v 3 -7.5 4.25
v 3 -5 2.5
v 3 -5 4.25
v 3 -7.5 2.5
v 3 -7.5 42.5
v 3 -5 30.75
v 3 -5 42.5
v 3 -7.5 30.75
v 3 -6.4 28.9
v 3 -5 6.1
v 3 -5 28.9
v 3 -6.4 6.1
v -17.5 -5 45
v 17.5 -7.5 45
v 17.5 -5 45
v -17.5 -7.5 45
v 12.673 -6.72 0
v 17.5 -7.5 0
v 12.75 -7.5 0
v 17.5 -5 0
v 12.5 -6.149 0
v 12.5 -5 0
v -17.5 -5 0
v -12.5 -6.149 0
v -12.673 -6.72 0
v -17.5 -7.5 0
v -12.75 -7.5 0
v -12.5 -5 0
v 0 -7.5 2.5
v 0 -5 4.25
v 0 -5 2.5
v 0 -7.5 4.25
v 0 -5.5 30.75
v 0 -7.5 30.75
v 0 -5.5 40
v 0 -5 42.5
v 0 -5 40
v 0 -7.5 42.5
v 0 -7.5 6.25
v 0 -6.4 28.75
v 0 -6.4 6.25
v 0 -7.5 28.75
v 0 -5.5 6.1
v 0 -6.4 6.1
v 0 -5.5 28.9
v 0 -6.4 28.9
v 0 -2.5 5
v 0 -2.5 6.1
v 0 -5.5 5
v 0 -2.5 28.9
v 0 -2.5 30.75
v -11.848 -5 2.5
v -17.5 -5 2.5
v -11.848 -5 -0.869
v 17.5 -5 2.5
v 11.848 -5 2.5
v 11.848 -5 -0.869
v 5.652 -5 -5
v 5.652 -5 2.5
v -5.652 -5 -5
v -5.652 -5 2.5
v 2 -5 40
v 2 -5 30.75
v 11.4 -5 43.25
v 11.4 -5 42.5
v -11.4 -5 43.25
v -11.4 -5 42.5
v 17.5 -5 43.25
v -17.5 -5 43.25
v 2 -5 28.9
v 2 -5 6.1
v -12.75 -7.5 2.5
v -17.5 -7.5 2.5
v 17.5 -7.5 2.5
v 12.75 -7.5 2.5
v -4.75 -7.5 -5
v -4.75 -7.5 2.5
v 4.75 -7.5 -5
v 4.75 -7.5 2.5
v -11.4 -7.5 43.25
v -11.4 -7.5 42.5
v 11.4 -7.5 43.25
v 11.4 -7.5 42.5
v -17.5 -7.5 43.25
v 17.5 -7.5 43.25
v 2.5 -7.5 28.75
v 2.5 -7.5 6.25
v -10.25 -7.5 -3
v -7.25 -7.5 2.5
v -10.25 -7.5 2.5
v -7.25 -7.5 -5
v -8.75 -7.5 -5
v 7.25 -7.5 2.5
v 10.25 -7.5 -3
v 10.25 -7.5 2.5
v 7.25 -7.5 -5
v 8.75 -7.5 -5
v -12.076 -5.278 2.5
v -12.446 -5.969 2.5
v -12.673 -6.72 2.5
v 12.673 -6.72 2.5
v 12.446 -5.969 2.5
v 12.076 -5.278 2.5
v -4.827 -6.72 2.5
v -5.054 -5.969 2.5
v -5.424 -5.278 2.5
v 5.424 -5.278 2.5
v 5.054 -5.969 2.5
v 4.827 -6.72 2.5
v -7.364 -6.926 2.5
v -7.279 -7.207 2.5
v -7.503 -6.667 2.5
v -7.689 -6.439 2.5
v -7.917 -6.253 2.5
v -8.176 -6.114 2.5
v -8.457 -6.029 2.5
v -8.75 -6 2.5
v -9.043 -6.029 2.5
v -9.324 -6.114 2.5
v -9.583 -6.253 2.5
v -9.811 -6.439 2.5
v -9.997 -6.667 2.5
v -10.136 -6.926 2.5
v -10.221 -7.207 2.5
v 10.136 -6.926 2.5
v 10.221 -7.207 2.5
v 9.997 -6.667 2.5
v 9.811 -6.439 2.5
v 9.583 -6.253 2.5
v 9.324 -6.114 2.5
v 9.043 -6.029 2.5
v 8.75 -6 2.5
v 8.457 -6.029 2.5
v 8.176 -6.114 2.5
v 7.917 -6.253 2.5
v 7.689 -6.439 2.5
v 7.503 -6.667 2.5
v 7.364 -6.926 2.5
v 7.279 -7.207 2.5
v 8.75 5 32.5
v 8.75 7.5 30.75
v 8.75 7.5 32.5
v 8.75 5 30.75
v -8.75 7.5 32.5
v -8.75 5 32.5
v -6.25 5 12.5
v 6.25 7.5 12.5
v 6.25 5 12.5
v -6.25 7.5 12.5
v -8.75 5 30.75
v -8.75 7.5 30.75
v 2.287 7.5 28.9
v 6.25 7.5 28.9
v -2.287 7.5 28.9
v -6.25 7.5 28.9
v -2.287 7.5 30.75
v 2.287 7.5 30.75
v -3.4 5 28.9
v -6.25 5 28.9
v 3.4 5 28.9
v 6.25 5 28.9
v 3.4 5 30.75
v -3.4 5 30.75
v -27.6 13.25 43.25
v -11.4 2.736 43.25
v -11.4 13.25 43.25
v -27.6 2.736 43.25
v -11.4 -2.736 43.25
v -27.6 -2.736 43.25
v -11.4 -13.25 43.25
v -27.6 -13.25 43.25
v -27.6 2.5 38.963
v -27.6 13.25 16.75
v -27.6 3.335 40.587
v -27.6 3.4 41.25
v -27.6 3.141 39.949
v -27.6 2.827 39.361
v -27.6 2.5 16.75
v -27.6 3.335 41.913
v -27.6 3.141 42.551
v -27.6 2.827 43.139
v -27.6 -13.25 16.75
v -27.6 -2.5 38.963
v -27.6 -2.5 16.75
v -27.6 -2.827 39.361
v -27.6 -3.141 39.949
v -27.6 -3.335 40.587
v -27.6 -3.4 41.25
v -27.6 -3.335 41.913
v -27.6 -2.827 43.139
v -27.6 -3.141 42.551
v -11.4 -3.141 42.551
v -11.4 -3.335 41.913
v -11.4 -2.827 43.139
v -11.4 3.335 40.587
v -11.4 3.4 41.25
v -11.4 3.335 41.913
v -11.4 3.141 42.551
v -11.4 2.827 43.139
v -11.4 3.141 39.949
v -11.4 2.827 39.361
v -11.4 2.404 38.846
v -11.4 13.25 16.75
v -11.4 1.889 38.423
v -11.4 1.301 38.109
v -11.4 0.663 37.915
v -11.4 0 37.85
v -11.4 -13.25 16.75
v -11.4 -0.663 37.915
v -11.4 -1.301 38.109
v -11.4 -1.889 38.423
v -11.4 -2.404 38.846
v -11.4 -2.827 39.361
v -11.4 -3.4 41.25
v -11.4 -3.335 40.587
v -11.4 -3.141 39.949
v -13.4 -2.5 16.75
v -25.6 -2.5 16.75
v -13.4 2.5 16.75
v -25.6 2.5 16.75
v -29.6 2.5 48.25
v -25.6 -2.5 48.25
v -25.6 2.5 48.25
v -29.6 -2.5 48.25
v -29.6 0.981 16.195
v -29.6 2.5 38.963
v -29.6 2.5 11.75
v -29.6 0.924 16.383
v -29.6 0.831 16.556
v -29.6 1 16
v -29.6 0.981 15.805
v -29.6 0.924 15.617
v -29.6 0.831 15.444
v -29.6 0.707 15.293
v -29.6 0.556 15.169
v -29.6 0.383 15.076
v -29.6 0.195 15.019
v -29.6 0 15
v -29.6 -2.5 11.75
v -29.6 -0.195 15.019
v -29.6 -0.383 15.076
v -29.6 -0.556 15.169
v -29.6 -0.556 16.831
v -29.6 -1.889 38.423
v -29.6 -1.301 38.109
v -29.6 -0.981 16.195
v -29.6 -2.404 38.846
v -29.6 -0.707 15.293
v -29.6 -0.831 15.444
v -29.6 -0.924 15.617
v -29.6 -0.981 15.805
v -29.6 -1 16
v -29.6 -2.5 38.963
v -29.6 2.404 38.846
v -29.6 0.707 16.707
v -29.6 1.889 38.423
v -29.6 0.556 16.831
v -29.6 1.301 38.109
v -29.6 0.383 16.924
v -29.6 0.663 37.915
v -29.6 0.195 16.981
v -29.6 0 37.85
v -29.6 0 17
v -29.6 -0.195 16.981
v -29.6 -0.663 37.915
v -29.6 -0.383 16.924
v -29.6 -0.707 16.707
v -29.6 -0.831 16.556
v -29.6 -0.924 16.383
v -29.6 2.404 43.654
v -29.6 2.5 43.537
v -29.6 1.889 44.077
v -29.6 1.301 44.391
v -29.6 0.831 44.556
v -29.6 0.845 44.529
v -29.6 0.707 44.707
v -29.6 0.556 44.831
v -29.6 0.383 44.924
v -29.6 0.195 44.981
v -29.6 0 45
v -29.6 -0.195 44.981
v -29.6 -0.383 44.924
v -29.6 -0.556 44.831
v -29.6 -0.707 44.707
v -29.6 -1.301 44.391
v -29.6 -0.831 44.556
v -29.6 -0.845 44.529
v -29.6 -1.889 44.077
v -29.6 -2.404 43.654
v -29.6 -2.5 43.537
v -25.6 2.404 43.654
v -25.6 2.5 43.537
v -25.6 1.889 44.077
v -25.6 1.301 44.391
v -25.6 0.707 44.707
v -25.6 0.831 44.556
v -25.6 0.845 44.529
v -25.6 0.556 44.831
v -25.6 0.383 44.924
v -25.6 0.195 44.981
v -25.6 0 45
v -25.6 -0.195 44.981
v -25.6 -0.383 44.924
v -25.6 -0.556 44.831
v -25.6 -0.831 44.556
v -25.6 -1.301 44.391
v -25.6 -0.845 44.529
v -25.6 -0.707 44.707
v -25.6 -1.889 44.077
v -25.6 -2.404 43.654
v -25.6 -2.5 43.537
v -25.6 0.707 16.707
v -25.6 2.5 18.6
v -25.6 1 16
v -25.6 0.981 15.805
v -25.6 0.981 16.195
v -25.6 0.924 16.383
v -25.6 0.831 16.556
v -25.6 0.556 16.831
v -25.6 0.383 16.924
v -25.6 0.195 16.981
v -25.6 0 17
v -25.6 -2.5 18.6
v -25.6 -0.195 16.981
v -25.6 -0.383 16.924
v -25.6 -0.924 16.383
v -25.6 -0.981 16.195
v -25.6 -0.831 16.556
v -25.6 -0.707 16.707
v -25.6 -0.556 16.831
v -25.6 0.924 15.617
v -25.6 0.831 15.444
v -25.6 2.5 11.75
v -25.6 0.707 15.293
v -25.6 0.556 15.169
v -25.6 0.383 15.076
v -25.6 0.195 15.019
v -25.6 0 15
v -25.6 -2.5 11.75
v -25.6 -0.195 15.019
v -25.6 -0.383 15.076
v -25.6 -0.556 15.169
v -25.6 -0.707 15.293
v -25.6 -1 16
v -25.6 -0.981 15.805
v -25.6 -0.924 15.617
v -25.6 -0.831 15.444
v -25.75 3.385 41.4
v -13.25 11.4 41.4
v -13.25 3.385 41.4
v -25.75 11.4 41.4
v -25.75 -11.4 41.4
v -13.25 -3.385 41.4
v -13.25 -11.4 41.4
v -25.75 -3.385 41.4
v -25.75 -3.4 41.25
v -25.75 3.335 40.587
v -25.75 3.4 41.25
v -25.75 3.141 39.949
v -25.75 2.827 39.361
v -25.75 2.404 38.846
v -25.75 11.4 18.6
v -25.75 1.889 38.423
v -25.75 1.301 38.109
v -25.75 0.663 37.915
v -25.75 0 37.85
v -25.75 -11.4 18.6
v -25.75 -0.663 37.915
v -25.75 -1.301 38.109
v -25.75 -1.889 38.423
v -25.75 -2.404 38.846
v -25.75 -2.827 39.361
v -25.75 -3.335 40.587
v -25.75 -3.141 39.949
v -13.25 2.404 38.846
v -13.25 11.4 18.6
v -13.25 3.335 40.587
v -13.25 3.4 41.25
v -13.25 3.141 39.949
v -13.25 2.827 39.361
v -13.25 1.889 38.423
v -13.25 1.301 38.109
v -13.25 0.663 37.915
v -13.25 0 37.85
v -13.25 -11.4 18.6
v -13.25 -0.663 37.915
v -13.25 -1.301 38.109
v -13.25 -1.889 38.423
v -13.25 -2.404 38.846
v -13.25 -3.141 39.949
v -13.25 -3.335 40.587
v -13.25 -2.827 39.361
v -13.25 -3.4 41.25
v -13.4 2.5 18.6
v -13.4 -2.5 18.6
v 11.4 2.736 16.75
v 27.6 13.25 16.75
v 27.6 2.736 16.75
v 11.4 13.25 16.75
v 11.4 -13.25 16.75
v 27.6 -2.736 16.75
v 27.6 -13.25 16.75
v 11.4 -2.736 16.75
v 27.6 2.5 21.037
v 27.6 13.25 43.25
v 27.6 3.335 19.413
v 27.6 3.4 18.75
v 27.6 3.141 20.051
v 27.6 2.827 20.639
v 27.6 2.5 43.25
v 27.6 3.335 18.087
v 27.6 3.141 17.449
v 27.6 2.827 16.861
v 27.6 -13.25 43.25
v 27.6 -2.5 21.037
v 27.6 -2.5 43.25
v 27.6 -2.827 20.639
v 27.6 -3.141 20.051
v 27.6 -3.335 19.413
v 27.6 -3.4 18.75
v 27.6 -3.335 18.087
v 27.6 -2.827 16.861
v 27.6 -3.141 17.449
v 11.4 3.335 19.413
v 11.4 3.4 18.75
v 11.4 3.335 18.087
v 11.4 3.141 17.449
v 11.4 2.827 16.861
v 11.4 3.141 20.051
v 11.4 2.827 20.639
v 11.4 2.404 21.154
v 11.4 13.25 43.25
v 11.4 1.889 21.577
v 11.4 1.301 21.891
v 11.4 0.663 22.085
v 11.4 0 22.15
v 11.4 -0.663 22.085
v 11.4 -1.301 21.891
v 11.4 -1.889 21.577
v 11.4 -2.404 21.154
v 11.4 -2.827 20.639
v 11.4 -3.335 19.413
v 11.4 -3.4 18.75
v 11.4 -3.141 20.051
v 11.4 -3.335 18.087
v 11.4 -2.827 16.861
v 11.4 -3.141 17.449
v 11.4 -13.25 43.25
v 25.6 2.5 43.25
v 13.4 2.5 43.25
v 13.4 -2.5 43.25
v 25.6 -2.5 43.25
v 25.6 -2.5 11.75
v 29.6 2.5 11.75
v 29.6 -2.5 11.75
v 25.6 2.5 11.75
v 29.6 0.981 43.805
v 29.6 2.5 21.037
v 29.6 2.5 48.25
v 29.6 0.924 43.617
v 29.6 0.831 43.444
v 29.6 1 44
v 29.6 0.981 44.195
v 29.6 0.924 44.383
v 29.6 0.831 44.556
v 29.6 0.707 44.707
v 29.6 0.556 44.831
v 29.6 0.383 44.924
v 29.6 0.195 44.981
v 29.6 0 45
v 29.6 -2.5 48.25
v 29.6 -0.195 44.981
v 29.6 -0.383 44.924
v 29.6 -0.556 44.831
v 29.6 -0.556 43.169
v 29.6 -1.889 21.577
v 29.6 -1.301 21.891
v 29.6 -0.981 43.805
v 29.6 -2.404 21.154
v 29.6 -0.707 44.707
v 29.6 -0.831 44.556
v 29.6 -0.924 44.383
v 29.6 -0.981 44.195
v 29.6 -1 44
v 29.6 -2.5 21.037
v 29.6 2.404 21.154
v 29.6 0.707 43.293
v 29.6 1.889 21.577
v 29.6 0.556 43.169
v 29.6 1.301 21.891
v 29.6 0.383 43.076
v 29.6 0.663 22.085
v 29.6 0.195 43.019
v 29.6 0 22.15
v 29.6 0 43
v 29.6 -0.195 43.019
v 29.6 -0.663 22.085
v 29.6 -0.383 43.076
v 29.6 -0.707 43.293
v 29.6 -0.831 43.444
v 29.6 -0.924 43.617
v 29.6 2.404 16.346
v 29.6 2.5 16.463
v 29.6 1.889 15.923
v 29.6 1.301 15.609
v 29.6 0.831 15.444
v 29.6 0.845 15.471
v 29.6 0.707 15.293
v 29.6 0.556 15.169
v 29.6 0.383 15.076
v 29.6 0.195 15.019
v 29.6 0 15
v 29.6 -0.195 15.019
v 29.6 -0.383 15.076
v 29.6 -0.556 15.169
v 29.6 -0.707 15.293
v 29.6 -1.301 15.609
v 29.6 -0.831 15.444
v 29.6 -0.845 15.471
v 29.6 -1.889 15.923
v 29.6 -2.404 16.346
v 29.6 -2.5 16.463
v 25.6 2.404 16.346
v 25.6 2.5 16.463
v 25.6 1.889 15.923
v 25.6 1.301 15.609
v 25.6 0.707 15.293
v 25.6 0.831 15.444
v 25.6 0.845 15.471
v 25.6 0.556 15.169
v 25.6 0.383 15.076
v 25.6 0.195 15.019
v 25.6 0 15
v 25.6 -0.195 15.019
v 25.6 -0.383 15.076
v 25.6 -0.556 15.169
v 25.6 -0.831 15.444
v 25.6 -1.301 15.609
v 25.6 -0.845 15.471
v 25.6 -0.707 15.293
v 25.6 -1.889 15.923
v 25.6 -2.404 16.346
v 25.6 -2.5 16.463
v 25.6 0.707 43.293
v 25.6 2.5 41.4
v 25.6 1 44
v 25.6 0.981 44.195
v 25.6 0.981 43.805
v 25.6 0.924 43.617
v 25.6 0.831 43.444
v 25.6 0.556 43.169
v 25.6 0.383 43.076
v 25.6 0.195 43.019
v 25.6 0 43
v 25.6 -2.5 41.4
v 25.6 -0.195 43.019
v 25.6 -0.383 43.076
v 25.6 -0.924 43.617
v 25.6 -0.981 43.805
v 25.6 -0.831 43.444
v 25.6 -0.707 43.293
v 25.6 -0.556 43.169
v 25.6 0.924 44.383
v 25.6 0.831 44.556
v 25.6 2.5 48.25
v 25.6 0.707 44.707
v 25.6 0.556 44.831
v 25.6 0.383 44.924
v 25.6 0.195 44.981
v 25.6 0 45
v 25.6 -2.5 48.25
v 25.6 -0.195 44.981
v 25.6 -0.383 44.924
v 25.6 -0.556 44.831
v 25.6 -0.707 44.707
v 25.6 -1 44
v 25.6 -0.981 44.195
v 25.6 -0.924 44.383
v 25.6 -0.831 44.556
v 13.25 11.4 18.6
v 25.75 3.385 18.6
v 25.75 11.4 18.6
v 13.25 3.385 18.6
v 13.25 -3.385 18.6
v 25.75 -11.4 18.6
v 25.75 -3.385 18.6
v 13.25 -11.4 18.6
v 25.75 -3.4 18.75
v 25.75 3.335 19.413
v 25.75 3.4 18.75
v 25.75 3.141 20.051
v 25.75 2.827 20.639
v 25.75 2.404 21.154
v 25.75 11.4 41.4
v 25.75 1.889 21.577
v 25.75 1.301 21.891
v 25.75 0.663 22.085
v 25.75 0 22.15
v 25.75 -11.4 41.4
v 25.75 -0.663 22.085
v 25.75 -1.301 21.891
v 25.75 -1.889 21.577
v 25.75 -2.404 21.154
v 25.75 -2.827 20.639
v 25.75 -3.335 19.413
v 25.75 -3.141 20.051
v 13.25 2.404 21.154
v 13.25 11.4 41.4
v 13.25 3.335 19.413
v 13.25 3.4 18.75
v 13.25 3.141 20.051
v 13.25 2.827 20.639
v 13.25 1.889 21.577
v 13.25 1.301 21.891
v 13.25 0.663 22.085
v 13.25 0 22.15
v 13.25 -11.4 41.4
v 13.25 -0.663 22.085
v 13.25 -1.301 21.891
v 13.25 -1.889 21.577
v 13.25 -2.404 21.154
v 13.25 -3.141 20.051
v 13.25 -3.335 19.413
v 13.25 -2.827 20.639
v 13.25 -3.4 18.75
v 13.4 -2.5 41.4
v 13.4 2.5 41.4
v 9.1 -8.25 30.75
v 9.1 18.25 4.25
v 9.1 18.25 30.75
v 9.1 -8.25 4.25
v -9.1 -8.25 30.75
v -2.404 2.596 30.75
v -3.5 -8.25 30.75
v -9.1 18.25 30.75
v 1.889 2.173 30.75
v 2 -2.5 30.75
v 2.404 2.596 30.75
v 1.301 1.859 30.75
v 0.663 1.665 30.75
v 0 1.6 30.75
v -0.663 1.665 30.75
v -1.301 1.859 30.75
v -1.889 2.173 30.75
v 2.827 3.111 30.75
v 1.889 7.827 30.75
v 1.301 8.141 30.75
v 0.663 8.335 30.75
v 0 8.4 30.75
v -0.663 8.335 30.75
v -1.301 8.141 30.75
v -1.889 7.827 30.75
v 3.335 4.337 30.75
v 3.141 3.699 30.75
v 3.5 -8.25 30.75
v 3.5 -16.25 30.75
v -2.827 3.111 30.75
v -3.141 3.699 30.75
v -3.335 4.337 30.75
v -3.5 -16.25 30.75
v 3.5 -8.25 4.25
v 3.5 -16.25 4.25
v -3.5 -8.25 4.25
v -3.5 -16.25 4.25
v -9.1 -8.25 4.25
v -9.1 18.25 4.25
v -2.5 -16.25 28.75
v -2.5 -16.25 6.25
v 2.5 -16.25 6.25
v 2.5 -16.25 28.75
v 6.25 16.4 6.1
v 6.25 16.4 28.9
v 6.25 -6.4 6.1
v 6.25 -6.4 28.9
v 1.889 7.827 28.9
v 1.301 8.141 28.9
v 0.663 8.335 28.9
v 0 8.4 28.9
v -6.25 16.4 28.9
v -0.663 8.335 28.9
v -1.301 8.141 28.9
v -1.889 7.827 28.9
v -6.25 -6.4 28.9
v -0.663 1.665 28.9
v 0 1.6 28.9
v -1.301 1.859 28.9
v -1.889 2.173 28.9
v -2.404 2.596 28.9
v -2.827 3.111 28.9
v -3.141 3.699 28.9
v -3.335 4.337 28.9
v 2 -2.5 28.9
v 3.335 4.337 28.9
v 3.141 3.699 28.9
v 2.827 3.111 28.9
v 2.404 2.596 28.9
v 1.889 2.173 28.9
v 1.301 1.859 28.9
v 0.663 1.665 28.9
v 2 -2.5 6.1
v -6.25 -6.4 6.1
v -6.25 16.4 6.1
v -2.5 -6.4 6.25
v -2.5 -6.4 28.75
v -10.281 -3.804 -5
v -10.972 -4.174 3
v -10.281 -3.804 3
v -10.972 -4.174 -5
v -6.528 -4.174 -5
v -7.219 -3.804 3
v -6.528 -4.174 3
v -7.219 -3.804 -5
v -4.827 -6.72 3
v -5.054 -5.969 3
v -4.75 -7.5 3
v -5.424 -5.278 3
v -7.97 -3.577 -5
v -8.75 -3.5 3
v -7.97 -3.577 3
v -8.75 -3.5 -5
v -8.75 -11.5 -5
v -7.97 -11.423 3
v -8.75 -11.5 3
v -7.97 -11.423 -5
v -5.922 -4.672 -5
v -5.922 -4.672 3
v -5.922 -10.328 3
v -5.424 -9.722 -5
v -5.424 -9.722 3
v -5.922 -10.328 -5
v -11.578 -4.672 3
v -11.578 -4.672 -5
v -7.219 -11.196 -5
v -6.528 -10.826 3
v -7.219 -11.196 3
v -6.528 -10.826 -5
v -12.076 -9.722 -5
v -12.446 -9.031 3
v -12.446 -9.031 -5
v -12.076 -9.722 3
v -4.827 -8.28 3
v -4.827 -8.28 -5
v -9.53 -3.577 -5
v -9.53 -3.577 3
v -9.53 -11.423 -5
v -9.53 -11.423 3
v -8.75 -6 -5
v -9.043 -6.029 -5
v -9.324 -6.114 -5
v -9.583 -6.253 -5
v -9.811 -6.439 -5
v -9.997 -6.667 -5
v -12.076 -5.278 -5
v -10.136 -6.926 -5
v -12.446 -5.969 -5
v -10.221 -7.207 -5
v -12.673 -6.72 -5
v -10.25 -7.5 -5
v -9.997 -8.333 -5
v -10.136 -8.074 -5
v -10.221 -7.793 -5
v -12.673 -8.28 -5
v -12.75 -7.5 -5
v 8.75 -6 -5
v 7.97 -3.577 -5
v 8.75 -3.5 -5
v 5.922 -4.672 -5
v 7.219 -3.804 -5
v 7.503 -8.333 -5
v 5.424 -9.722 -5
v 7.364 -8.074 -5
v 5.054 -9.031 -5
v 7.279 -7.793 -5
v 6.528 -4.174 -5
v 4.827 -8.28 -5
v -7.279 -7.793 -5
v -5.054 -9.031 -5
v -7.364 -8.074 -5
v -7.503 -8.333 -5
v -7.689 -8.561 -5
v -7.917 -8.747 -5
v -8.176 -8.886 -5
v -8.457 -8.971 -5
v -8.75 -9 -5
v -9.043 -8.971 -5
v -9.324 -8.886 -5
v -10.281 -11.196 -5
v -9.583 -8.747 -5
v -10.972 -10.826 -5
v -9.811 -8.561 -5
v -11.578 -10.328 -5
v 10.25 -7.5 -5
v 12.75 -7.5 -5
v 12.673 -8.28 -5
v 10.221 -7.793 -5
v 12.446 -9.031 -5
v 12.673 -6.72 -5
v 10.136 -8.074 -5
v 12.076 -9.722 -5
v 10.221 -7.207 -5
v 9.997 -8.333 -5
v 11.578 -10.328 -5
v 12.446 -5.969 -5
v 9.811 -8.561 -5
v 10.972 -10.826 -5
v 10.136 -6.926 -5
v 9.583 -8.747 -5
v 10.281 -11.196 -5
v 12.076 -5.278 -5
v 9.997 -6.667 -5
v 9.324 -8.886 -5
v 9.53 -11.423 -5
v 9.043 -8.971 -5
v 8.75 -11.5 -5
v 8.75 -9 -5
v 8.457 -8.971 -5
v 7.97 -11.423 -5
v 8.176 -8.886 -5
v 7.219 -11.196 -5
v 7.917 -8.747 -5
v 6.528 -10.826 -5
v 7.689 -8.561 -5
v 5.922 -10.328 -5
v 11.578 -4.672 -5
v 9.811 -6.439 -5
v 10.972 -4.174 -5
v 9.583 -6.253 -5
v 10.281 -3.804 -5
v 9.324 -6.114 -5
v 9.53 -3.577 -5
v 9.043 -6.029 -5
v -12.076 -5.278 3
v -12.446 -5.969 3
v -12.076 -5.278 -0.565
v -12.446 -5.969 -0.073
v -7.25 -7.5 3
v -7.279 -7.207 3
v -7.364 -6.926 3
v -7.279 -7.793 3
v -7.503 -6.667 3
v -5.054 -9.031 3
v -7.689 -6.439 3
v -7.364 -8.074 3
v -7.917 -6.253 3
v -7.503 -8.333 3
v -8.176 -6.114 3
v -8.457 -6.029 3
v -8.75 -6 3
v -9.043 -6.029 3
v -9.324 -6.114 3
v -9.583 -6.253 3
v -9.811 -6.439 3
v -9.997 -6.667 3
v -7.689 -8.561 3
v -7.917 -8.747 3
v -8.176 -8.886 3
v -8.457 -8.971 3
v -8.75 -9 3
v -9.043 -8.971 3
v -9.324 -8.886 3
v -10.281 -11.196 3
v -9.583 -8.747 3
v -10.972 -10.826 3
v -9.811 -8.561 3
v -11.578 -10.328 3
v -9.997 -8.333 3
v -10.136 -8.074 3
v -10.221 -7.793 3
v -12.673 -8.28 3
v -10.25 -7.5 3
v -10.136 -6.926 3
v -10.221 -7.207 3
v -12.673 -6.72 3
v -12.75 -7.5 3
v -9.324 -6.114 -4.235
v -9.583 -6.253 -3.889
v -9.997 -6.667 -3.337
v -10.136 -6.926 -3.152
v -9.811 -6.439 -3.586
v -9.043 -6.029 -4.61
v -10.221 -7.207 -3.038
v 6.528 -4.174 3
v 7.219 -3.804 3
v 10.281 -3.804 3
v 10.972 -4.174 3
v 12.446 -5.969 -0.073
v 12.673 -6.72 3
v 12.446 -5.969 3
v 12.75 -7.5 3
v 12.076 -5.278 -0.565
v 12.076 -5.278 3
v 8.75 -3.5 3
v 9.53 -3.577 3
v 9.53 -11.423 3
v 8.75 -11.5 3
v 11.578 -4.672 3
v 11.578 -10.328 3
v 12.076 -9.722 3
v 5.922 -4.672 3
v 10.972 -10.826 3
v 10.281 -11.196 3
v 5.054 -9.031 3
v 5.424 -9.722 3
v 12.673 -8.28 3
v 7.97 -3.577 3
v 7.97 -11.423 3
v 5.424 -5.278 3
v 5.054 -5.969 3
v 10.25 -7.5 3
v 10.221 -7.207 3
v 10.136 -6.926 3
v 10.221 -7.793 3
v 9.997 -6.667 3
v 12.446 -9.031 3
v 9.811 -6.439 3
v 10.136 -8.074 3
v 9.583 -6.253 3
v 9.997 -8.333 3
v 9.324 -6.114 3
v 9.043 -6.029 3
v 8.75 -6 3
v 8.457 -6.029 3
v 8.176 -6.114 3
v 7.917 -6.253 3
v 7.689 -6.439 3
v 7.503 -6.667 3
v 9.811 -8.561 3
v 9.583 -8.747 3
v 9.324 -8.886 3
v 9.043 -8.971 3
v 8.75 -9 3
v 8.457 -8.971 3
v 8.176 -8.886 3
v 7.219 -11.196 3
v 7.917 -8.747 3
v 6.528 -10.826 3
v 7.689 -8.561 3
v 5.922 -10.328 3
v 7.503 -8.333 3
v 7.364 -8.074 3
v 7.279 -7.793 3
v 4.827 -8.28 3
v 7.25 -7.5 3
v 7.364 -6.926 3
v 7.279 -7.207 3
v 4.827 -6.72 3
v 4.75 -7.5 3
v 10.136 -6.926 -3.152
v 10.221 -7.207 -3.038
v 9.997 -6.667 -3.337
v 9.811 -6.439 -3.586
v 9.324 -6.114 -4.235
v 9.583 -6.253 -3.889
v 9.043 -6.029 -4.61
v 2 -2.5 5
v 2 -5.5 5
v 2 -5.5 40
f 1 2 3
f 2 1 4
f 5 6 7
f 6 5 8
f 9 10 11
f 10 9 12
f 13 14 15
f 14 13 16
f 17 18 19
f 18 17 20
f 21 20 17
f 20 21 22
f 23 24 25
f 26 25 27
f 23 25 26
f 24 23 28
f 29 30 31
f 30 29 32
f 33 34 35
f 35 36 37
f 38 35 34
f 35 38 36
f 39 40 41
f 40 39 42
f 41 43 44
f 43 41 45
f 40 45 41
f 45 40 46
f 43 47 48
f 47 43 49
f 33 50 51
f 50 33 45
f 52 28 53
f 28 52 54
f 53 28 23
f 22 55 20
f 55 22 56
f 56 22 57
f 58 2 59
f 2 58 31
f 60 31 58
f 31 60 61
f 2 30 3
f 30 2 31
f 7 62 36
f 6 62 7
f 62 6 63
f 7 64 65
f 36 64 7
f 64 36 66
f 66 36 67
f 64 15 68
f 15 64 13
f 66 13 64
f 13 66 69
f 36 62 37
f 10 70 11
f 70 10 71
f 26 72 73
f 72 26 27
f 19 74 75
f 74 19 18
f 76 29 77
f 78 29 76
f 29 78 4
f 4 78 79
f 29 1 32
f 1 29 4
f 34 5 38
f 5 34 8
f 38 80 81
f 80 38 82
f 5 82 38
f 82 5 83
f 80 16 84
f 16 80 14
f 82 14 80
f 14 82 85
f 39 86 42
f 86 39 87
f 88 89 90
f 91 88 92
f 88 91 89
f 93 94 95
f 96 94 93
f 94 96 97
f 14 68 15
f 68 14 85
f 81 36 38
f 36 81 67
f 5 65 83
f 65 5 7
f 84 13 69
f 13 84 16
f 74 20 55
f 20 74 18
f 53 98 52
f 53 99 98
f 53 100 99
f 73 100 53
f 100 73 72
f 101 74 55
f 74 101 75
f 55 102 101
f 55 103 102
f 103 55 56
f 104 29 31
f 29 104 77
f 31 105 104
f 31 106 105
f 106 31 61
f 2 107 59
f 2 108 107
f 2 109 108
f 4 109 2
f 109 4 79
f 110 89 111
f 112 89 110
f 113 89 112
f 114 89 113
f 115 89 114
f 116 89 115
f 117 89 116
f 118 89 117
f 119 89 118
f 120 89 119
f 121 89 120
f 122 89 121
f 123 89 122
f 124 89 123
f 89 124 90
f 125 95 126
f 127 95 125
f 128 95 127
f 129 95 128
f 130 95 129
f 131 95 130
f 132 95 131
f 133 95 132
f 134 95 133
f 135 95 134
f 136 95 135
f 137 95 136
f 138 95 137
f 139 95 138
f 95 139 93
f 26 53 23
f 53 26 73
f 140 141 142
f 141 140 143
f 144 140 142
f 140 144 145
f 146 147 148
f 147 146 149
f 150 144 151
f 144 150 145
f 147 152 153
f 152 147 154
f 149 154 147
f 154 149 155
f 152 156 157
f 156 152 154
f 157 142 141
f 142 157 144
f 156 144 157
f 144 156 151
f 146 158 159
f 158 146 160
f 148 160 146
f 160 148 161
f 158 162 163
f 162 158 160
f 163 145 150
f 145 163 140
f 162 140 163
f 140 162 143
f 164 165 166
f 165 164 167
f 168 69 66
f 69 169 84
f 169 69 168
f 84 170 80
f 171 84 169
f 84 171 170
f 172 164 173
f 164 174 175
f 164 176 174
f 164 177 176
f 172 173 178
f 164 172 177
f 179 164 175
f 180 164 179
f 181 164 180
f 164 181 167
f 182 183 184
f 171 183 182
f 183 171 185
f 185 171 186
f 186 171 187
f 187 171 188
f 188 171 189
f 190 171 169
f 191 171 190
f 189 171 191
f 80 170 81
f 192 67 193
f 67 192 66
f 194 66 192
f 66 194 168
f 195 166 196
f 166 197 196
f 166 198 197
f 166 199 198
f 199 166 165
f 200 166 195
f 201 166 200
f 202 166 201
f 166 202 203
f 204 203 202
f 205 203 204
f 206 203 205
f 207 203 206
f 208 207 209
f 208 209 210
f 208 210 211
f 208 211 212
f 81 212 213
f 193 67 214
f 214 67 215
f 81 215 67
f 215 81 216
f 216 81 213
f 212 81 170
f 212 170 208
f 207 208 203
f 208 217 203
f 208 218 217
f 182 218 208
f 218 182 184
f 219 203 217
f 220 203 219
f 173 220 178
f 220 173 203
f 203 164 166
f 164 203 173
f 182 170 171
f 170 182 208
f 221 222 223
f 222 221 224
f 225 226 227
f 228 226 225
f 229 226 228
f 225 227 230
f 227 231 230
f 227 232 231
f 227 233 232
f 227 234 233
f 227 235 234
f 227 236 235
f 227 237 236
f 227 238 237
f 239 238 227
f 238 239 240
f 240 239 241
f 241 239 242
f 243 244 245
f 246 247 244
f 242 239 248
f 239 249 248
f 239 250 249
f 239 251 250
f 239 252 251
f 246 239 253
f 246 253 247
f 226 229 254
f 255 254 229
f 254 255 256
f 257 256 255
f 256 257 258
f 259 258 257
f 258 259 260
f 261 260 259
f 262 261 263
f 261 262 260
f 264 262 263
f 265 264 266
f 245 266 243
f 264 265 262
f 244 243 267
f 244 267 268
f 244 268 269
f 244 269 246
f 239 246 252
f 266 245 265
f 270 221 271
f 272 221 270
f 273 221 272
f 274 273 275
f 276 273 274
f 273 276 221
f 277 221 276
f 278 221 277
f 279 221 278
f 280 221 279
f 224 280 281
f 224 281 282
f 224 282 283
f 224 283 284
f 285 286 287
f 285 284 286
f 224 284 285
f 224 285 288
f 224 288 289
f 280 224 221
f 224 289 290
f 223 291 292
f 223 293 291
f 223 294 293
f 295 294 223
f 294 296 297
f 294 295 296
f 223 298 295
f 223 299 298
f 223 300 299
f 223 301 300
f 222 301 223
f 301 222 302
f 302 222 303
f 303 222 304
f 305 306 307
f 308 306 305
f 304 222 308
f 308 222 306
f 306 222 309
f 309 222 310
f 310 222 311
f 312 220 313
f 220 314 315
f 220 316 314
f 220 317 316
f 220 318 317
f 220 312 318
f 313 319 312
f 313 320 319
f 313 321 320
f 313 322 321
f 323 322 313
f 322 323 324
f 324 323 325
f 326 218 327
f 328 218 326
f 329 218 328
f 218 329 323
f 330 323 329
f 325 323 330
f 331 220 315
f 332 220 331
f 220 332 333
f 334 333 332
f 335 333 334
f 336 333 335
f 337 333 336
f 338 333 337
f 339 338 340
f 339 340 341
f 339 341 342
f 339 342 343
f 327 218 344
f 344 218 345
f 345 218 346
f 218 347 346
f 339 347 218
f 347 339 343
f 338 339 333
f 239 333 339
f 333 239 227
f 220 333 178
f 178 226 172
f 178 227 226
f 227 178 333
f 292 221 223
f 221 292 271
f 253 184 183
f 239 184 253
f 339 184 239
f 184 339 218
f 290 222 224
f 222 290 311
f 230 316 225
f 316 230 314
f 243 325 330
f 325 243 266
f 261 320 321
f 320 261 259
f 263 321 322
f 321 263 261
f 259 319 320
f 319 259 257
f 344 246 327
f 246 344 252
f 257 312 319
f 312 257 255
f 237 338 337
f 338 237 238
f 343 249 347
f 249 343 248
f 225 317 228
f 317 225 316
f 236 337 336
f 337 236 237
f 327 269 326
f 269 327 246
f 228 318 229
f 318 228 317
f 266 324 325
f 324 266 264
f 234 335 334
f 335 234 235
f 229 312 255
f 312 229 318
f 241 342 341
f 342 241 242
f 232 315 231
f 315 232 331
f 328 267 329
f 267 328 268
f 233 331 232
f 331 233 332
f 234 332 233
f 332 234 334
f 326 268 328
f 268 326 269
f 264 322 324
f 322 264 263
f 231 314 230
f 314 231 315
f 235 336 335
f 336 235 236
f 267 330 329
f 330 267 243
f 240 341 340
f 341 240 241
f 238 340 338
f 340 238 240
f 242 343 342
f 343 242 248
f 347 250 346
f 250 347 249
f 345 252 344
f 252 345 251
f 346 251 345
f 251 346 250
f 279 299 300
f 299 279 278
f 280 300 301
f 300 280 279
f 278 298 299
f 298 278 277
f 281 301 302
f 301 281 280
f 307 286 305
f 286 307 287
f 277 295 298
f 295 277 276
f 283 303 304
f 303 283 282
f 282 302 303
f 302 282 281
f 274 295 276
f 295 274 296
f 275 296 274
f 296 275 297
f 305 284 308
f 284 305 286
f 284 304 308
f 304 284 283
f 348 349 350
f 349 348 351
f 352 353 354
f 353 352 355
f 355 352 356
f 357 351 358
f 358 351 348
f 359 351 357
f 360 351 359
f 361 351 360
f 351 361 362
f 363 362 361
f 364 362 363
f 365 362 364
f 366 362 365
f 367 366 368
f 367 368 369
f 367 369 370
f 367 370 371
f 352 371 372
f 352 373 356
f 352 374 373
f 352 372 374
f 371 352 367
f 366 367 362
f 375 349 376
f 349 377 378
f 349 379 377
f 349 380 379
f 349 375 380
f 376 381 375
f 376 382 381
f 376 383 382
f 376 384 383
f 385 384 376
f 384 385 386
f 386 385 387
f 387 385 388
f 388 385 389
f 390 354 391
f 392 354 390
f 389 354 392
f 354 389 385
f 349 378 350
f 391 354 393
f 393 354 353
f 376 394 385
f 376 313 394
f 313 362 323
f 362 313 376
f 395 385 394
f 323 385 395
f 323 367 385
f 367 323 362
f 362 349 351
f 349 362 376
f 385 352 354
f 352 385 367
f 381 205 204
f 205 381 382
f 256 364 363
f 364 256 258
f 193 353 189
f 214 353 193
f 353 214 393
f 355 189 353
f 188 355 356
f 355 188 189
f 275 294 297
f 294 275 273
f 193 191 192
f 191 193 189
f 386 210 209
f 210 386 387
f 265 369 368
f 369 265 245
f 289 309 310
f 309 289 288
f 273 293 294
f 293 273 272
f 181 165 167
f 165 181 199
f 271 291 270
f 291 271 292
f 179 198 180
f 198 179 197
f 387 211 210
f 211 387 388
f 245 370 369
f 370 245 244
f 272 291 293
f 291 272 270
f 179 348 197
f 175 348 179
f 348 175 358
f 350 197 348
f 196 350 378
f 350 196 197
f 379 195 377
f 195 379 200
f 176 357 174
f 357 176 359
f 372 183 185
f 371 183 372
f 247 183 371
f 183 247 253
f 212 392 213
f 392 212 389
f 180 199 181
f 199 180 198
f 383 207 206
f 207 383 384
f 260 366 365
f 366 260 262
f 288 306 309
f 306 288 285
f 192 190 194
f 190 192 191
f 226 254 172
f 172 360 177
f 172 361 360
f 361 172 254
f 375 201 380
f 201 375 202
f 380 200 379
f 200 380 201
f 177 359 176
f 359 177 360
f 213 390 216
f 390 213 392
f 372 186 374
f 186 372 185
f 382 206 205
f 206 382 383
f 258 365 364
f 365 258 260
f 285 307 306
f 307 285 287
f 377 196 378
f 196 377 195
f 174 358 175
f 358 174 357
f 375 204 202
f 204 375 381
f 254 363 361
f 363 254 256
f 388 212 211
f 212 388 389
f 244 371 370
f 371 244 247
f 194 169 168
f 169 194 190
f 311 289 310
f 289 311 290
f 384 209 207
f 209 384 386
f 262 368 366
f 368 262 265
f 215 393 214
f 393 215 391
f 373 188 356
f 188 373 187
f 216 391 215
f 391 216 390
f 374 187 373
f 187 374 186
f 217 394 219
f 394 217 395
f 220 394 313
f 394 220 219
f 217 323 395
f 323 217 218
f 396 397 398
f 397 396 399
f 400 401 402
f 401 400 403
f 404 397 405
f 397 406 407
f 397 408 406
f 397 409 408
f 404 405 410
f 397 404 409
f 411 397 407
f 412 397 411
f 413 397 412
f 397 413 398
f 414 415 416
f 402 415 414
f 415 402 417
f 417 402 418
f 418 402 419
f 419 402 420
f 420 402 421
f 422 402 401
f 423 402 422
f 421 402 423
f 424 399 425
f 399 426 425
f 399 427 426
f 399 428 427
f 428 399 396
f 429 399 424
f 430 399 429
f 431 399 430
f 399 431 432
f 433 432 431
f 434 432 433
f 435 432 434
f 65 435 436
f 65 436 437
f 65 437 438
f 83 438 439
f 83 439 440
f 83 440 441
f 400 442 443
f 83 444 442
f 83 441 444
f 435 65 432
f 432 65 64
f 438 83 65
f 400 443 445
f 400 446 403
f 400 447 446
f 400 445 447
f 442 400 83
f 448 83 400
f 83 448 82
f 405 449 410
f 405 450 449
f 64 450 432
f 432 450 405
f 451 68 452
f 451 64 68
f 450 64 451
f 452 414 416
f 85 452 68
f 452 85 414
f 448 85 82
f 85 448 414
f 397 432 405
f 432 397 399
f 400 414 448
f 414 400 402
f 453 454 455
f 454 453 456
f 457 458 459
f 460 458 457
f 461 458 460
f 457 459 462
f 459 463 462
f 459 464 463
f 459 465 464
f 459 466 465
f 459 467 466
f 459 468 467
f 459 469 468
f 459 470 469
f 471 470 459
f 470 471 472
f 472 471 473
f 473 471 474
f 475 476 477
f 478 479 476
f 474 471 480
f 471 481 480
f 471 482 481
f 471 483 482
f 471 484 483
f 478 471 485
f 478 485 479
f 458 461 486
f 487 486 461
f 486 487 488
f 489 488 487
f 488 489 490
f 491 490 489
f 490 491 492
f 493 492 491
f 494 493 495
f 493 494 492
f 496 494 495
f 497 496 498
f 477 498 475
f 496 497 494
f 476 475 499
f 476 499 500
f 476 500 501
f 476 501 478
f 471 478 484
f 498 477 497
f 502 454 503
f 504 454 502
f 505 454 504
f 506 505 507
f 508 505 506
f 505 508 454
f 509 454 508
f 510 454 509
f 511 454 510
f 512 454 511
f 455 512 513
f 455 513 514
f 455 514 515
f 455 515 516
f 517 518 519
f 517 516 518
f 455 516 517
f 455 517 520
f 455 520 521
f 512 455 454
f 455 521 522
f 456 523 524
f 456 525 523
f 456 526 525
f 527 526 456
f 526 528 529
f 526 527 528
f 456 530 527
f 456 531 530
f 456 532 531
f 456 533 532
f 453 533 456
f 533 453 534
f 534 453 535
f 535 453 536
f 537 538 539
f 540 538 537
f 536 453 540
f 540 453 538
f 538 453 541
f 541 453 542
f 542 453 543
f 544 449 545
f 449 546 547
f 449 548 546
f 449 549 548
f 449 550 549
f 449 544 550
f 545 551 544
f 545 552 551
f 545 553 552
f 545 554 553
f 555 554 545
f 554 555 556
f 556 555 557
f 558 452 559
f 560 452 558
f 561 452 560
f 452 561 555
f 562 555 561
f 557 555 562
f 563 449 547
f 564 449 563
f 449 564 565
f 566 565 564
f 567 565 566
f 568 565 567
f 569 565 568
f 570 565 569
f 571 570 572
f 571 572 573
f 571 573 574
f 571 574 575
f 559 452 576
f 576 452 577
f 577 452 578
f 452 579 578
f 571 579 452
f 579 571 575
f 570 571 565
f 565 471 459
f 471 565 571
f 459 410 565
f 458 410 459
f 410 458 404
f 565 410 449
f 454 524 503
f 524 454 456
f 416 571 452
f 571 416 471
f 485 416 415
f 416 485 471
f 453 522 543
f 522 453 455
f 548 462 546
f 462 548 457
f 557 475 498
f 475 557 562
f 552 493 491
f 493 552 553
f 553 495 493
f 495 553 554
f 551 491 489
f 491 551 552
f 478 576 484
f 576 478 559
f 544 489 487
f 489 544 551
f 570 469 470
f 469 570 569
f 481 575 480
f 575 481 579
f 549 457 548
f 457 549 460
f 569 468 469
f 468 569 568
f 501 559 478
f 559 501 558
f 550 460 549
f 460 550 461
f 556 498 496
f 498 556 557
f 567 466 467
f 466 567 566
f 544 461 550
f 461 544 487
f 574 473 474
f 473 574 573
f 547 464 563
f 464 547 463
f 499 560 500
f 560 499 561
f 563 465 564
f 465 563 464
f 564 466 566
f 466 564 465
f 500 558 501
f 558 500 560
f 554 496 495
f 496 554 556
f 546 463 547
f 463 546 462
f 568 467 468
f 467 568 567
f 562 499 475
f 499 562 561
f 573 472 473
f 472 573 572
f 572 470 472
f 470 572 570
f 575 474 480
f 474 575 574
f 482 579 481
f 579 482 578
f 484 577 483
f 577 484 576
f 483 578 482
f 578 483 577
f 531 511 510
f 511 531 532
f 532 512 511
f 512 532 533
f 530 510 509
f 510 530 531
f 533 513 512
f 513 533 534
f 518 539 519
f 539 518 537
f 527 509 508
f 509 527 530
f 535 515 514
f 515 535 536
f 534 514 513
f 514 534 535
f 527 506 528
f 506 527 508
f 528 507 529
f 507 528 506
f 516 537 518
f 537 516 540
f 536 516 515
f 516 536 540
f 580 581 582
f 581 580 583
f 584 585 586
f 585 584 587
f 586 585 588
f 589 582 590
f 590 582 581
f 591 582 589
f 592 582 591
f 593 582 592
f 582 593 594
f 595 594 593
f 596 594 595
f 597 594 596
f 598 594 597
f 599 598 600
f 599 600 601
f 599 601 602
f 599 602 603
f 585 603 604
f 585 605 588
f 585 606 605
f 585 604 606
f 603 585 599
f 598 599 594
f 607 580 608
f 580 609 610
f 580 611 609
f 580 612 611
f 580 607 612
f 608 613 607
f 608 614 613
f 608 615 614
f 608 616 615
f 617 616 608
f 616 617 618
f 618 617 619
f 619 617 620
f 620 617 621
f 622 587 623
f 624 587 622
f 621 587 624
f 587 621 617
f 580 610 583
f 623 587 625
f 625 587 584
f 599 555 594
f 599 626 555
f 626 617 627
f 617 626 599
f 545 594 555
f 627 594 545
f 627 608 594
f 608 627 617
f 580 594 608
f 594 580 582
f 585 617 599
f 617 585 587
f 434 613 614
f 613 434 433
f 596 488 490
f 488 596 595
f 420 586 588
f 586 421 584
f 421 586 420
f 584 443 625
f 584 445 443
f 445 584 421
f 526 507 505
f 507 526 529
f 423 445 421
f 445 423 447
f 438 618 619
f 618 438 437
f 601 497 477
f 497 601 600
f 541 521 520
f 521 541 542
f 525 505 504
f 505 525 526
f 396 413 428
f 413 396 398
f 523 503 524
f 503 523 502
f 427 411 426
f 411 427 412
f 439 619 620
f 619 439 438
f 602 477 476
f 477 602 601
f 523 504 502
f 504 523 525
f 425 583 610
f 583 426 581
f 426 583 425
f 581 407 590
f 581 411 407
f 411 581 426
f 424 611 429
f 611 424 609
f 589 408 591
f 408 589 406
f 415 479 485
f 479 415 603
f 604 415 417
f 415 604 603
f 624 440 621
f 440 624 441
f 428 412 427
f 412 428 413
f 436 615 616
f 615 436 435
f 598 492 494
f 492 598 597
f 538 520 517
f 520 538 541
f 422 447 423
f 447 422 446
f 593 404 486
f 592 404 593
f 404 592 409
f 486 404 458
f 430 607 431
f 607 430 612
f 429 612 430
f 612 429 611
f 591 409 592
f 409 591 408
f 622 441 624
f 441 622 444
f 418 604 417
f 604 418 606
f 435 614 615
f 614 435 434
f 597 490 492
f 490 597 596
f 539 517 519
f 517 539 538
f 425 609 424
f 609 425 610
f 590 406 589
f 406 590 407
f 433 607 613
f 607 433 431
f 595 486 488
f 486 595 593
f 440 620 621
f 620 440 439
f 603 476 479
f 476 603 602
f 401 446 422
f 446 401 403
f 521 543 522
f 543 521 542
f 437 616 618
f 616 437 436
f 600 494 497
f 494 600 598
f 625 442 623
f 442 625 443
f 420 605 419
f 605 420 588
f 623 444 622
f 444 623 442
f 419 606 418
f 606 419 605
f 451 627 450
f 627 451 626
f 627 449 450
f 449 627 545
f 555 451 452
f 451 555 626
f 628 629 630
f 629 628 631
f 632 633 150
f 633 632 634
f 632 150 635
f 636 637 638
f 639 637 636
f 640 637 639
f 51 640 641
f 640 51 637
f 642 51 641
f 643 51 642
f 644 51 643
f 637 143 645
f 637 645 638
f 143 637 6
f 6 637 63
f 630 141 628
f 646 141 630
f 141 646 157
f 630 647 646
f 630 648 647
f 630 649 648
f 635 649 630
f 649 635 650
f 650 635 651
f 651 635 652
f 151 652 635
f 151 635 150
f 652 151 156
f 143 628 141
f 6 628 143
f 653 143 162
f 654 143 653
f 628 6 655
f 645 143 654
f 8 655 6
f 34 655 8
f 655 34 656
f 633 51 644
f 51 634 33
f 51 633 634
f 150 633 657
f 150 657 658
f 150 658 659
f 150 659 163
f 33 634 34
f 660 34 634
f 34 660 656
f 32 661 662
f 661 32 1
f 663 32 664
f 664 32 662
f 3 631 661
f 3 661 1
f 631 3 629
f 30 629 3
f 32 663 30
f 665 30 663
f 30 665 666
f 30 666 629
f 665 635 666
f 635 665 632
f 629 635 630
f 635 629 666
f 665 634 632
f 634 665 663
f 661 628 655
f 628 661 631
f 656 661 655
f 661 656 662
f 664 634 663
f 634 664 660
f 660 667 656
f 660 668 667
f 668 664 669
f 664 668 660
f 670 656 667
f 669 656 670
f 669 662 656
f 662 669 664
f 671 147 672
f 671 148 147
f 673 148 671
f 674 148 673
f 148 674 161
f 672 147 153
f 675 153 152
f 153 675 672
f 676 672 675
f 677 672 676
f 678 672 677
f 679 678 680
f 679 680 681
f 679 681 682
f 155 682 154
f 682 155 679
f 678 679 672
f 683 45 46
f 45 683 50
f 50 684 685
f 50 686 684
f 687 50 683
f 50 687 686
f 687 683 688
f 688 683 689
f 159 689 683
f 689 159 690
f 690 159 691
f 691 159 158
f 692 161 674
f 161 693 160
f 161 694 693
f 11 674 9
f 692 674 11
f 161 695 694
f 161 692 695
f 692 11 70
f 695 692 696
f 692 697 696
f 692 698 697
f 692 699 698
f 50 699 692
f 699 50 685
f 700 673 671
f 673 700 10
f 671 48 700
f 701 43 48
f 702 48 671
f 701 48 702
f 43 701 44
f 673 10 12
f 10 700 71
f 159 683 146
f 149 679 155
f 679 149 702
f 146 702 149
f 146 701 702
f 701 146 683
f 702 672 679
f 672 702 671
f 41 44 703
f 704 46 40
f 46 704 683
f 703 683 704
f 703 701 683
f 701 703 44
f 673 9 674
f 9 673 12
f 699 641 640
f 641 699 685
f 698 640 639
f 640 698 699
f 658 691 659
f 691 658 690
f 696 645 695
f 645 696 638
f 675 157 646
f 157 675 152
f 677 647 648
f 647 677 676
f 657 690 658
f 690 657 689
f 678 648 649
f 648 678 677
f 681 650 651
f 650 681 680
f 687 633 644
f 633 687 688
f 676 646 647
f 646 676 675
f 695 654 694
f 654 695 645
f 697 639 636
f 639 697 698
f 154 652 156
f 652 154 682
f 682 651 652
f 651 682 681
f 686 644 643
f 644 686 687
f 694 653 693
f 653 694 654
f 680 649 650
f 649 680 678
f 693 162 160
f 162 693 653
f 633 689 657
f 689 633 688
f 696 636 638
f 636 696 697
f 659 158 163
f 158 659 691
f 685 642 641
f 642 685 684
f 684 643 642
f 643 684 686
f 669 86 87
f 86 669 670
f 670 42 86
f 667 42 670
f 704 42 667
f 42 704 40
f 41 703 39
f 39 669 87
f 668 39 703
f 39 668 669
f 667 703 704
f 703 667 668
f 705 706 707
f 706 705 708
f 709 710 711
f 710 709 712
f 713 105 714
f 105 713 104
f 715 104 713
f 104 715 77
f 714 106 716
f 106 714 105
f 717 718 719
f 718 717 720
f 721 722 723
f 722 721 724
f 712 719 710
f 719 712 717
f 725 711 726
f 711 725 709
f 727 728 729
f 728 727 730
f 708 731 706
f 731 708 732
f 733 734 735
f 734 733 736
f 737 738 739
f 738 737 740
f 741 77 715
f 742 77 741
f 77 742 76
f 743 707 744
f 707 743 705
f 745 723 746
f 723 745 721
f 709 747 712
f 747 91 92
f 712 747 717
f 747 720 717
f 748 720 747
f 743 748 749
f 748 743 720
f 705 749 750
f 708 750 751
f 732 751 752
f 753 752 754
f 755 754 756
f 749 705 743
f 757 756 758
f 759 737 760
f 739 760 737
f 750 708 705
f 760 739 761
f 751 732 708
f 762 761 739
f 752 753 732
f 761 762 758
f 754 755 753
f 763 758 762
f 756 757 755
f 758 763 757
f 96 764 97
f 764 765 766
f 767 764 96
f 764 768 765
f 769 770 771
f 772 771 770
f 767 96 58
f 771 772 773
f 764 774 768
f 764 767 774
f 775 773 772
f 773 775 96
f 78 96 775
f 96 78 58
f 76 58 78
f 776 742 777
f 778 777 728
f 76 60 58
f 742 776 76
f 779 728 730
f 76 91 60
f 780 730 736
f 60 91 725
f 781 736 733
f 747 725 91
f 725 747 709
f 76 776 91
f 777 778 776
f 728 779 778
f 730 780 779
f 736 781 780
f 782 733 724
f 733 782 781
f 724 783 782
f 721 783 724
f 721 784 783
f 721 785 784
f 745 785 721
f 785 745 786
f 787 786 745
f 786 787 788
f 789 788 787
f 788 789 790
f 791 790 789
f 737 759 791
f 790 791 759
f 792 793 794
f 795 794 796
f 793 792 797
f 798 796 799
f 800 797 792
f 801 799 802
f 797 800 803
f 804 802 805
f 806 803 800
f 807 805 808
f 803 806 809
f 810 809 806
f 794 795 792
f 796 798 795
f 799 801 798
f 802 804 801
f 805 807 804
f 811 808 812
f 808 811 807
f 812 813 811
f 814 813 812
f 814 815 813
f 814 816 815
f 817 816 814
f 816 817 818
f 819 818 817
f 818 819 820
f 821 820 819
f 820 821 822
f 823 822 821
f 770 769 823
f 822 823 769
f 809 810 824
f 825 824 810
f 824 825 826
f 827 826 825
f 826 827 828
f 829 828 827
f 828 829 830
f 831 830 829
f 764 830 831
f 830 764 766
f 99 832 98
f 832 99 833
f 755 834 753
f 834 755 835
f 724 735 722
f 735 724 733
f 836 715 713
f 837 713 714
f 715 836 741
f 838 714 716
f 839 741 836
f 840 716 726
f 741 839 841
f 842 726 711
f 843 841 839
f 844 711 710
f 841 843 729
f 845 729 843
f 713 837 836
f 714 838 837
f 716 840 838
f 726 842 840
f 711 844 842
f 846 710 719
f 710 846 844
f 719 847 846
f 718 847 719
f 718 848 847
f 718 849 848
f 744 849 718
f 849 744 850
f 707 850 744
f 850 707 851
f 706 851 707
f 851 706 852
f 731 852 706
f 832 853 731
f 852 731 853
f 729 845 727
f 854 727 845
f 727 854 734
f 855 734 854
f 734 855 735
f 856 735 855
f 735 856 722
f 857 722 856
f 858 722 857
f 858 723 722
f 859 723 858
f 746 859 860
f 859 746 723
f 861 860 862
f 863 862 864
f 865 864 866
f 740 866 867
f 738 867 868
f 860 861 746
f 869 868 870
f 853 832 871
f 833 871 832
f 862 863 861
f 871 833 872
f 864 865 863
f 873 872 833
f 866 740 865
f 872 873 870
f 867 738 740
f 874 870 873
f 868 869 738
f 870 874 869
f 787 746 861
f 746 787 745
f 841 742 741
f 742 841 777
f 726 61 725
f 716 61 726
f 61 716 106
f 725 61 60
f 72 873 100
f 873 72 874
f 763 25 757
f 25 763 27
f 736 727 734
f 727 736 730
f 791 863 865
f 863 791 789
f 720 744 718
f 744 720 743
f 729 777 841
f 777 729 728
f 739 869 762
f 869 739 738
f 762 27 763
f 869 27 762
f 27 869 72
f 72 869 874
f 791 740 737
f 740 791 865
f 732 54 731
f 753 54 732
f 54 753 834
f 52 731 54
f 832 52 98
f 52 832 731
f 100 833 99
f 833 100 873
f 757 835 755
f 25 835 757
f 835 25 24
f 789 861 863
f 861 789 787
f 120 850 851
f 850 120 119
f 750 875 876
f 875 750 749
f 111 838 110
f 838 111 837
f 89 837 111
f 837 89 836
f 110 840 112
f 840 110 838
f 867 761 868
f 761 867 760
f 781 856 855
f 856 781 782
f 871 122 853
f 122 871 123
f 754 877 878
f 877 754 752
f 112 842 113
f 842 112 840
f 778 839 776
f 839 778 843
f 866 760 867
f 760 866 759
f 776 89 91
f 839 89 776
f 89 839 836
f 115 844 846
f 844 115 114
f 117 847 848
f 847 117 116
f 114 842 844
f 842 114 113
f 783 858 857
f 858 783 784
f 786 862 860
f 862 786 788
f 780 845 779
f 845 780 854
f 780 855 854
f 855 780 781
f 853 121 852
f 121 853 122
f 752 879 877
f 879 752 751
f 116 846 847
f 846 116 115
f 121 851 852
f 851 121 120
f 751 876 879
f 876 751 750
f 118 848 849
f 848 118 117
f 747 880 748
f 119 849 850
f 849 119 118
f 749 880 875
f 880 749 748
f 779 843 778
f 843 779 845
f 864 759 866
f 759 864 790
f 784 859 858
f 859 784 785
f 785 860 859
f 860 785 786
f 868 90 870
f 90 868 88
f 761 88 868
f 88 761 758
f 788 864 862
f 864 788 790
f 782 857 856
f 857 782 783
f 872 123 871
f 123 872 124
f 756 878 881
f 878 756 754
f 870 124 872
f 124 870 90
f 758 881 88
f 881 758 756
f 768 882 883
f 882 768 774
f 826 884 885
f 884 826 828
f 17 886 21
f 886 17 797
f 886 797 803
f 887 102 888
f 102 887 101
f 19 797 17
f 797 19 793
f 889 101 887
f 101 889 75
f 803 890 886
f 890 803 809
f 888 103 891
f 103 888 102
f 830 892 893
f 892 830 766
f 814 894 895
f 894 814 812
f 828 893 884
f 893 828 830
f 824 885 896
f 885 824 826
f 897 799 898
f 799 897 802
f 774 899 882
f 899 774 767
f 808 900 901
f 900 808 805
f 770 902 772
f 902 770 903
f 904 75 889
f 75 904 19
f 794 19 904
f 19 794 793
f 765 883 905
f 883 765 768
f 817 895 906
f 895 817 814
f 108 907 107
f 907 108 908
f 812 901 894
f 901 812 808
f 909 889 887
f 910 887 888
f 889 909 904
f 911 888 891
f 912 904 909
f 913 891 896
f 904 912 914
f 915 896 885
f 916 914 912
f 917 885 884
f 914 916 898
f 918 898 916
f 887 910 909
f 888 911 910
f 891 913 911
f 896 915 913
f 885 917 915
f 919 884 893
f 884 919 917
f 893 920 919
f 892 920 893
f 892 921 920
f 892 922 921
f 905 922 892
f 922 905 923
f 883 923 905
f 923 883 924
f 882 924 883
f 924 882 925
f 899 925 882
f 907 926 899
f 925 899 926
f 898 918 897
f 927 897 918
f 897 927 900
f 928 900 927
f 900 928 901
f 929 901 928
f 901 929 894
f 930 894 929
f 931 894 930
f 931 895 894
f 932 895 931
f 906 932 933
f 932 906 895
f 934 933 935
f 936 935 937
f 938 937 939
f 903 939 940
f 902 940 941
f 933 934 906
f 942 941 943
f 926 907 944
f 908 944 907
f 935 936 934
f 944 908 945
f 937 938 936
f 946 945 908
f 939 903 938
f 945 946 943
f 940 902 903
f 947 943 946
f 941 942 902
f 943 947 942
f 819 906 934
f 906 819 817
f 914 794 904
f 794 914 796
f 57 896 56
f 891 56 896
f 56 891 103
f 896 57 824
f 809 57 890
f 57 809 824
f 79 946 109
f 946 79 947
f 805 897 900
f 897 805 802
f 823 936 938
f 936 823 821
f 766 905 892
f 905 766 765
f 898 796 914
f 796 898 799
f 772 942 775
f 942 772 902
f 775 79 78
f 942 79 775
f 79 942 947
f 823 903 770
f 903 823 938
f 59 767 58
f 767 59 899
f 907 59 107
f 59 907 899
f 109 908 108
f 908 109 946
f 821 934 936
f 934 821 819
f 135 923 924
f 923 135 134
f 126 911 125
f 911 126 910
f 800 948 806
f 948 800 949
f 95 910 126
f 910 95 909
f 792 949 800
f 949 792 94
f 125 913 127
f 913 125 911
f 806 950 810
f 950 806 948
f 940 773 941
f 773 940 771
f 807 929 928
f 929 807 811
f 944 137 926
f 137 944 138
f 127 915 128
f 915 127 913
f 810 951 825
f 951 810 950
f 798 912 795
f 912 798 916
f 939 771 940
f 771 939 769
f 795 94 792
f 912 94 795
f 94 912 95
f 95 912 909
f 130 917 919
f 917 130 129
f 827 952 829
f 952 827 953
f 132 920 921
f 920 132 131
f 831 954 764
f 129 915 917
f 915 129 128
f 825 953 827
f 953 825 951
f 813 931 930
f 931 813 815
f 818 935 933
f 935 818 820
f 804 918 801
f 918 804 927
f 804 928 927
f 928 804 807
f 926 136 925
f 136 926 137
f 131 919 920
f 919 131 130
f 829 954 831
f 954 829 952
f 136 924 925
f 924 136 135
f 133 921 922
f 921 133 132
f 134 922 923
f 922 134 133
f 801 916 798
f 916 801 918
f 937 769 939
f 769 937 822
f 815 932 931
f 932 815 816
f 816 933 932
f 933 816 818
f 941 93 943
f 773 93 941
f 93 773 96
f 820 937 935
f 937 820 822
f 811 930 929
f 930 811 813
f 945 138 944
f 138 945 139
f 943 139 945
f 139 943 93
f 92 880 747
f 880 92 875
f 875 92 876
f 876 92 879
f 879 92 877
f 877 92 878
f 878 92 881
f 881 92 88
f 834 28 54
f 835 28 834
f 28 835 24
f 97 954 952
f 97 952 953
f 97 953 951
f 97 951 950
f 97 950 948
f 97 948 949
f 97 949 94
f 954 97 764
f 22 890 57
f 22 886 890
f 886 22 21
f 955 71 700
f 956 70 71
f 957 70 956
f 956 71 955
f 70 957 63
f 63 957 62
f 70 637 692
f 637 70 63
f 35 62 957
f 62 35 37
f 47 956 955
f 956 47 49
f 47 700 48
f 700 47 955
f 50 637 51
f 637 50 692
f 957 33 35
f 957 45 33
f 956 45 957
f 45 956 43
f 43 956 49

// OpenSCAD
// file: config.scad
// ============================================
// NuiBone - 共通設定ファイル
// ============================================
// 15cmぬいぐるみ用ロボット骨格の寸法設定
// ============================================

// --- ぬいぐるみサイズ制約 ---
nui_height = 150;        // ぬいぐるみ全高 (mm)
nui_body_width = 40;     // 胴体最大幅 (mm)
nui_body_depth = 25;     // 胴体最大厚み (mm)

// --- 骨格寸法 ---
bone_thickness = 2.5;    // 骨格基本厚み (mm)
bone_width = 3;          // 骨格基本幅 (mm)

// 胴体フレーム
body_height = 45;        // 胴体高さ (mm)
body_width = 35;         // 胴体幅 (mm)
body_depth = 20;         // 胴体奥行き (mm)

// 肩
shoulder_width = 8;      // 肩部品幅 (mm)
shoulder_offset = 15;    // 肩の高さ位置（胴体上端から）

// 腕
arm_length = 35;         // 腕の長さ (mm)
arm_width = 4;           // 腕の幅 (mm)
arm_thickness = 2;       // 腕の厚み (mm)

// 足
foot_width = 12;         // 足幅 (mm)
foot_length = 15;        // 足長さ (mm)
foot_height = 5;         // 足高さ (mm)
leg_length = 30;         // 脚の長さ (mm)

// --- SG90サーボ寸法 ---
sg90_width = 12.2;       // サーボ幅 (mm)
sg90_height = 22.5;      // サーボ高さ (mm)
sg90_depth = 22.5;       // サーボ奥行き (mm)
sg90_shaft_height = 4;   // 出力軸高さ (mm)
sg90_shaft_dia = 4.8;    // 出力軸直径 (mm)
sg90_mount_hole = 2;     // 取付穴径 (mm)
sg90_mount_dist = 28;    // 取付穴間距離 (mm)
sg90_flange_width = 32.5; // フランジ幅 (mm)
sg90_flange_thick = 2.5; // フランジ厚み (mm)

// --- 磁石・重り ---
magnet_dia = 5;          // ネオジム磁石直径 (mm)
magnet_height = 2;       // ネオジム磁石高さ (mm)
weight_hole_dia = 6;     // 重り穴直径 (mm)

// --- 呼吸機構 ---
breath_stroke = 3;       // 呼吸ストローク (mm)
breath_plate_size = 15;  // 呼吸プレートサイズ (mm)

// --- 印刷設定 ---
wall_thick = 1.2;        // 壁厚み (mm)
tolerance = 0.3;         // 組み立て公差 (mm)
$fn = 32;                // 円の分割数

// --- 色設定（プレビュー用）---
color_bone = [0.9, 0.9, 0.85];
color_servo = [0.2, 0.2, 0.3];
color_magnet = [0.7, 0.7, 0.7];
// main file
// ============================================
// NuiBone - 胴体フレーム
// ============================================
// メインの骨格フレーム
// サーボ3個を収納、電池ホルダーは外付け
// ============================================

include <config.scad>

// --- 胴体フレーム本体 ---
module body_frame() {
    difference() {
        union() {
            // メインフレーム（背骨）
            main_spine();

            // 肩マウント部
            translate([0, 0, body_height - shoulder_offset])
                shoulder_mounts();

            // 呼吸サーボマウント
            translate([0, 0, body_height/2 - 5])
                breathing_servo_mount();

            // 腰部（足接続部）
            translate([0, 0, 0])
                hip_section();
        }

        // サーボ配線穴
        wiring_channels();
    }
}

// --- メインスパイン（背骨）---
module main_spine() {
    // 中央の背骨
    translate([0, -body_depth/2 + bone_thickness, 0])
        cube([bone_width, bone_thickness, body_height], center=false);

    // 上部横バー（肩支持）
    translate([-body_width/2, -body_depth/2 + bone_thickness, body_height - bone_thickness])
        cube([body_width, bone_thickness, bone_thickness]);

    // 下部横バー（腰支持）
    translate([-body_width/2, -body_depth/2 + bone_thickness, 0])
        cube([body_width, bone_thickness, bone_thickness]);

    // 前面補強バー
    translate([-body_width/4, body_depth/2 - bone_thickness*2, body_height/2 - 10])
        cube([body_width/2, bone_thickness, 20]);
}

// --- 肩マウント ---
module shoulder_mounts() {
    // 左肩サーボマウント
    translate([-body_width/2 - 2, 0, 0])
        rotate([0, -90, 0])
            servo_mount_vertical();

    // 右肩サーボマウント
    translate([body_width/2 + 2, 0, 0])
        rotate([0, 90, 0])
            servo_mount_vertical();
}

// --- 縦向きサーボマウント ---
module servo_mount_vertical() {
    difference() {
        // マウントベース
        union() {
            cube([sg90_height + 4, sg90_depth + 4, sg90_width + 4], center=true);

            // 取付フランジ
            translate([0, 0, sg90_width/2 + 2])
                cube([sg90_flange_width + 4, bone_thickness*2, 4], center=true);
        }

        // サーボ本体穴
        cube([sg90_height + tolerance, sg90_depth + tolerance, sg90_width + tolerance], center=true);

        // 出力軸穴
        translate([sg90_height/2, 0, 0])
            cylinder(h=sg90_width + 10, d=sg90_shaft_dia + 2, center=true);

        // 取付穴
        for (x = [-sg90_mount_dist/2, sg90_mount_dist/2]) {
            translate([x, 0, sg90_width/2 + 2])
                cylinder(h=10, d=sg90_mount_hole, center=true);
        }

        // 配線穴
        translate([-sg90_height/2 - 5, 0, 0])
            cube([10, 5, sg90_width], center=true);
    }
}

// --- 呼吸サーボマウント ---
module breathing_servo_mount() {
    translate([0, body_depth/4, 0]) {
        difference() {
            // マウントベース
            union() {
                cube([sg90_width + 6, sg90_depth + 4, sg90_height + 4], center=true);

                // 背骨への接続部
                translate([0, -sg90_depth/2 - body_depth/4, 0])
                    cube([bone_width + 4, body_depth/2, sg90_height + 4], center=true);
            }

            // サーボ本体穴
            cube([sg90_width + tolerance, sg90_depth + tolerance, sg90_height + tolerance], center=true);

            // 出力軸穴（上向き）
            translate([0, 0, sg90_height/2])
                cylinder(h=10, d=sg90_shaft_dia + 2, center=true);

            // 配線穴
            translate([0, -sg90_depth/2 - 5, 0])
                cube([5, 10, sg90_height], center=true);
        }
    }
}

// --- 腰部 ---
module hip_section() {
    // 腰ベース
    hull() {
        translate([-body_width/2 + 5, -body_depth/2 + bone_thickness, 0])
            cube([body_width - 10, bone_thickness, bone_thickness]);

        translate([-body_width/4, -body_depth/2 + bone_thickness, -5])
            cube([body_width/2, bone_thickness, bone_thickness]);
    }

    // 足接続ポイント（左右）
    for (x = [-body_width/4, body_width/4]) {
        translate([x, -body_depth/2 + bone_thickness, -5]) {
            difference() {
                cylinder(h=8, d=8);
                translate([0, 0, -1])
                    cylinder(h=10, d=3);  // 接続穴
            }
        }
    }
}

// --- 配線チャンネル ---
module wiring_channels() {
    // 背骨に沿った配線溝
    translate([0, -body_depth/2 + bone_thickness + 2, 5])
        cube([2, 3, body_height - 10], center=false);
}

// --- ESP32マウント穴（外付け用）---
module esp32_mount_holes() {
    // 背面にESP32を外付けするための穴
    translate([0, -body_depth/2 - 5, body_height/2]) {
        for (pos = [[-10, 0, -15], [10, 0, -15], [-10, 0, 15], [10, 0, 15]]) {
            translate(pos)
                rotate([90, 0, 0])
                    cylinder(h=10, d=2, center=true);
        }
    }
}

// --- メインの出力 ---
body_frame();

// プレビュー用サーボ表示（コメントアウトで非表示）
// %translate([-body_width/2 - sg90_width/2 - 2, 0, body_height - shoulder_offset])
//     cube([sg90_width, sg90_depth, sg90_height], center=true);
